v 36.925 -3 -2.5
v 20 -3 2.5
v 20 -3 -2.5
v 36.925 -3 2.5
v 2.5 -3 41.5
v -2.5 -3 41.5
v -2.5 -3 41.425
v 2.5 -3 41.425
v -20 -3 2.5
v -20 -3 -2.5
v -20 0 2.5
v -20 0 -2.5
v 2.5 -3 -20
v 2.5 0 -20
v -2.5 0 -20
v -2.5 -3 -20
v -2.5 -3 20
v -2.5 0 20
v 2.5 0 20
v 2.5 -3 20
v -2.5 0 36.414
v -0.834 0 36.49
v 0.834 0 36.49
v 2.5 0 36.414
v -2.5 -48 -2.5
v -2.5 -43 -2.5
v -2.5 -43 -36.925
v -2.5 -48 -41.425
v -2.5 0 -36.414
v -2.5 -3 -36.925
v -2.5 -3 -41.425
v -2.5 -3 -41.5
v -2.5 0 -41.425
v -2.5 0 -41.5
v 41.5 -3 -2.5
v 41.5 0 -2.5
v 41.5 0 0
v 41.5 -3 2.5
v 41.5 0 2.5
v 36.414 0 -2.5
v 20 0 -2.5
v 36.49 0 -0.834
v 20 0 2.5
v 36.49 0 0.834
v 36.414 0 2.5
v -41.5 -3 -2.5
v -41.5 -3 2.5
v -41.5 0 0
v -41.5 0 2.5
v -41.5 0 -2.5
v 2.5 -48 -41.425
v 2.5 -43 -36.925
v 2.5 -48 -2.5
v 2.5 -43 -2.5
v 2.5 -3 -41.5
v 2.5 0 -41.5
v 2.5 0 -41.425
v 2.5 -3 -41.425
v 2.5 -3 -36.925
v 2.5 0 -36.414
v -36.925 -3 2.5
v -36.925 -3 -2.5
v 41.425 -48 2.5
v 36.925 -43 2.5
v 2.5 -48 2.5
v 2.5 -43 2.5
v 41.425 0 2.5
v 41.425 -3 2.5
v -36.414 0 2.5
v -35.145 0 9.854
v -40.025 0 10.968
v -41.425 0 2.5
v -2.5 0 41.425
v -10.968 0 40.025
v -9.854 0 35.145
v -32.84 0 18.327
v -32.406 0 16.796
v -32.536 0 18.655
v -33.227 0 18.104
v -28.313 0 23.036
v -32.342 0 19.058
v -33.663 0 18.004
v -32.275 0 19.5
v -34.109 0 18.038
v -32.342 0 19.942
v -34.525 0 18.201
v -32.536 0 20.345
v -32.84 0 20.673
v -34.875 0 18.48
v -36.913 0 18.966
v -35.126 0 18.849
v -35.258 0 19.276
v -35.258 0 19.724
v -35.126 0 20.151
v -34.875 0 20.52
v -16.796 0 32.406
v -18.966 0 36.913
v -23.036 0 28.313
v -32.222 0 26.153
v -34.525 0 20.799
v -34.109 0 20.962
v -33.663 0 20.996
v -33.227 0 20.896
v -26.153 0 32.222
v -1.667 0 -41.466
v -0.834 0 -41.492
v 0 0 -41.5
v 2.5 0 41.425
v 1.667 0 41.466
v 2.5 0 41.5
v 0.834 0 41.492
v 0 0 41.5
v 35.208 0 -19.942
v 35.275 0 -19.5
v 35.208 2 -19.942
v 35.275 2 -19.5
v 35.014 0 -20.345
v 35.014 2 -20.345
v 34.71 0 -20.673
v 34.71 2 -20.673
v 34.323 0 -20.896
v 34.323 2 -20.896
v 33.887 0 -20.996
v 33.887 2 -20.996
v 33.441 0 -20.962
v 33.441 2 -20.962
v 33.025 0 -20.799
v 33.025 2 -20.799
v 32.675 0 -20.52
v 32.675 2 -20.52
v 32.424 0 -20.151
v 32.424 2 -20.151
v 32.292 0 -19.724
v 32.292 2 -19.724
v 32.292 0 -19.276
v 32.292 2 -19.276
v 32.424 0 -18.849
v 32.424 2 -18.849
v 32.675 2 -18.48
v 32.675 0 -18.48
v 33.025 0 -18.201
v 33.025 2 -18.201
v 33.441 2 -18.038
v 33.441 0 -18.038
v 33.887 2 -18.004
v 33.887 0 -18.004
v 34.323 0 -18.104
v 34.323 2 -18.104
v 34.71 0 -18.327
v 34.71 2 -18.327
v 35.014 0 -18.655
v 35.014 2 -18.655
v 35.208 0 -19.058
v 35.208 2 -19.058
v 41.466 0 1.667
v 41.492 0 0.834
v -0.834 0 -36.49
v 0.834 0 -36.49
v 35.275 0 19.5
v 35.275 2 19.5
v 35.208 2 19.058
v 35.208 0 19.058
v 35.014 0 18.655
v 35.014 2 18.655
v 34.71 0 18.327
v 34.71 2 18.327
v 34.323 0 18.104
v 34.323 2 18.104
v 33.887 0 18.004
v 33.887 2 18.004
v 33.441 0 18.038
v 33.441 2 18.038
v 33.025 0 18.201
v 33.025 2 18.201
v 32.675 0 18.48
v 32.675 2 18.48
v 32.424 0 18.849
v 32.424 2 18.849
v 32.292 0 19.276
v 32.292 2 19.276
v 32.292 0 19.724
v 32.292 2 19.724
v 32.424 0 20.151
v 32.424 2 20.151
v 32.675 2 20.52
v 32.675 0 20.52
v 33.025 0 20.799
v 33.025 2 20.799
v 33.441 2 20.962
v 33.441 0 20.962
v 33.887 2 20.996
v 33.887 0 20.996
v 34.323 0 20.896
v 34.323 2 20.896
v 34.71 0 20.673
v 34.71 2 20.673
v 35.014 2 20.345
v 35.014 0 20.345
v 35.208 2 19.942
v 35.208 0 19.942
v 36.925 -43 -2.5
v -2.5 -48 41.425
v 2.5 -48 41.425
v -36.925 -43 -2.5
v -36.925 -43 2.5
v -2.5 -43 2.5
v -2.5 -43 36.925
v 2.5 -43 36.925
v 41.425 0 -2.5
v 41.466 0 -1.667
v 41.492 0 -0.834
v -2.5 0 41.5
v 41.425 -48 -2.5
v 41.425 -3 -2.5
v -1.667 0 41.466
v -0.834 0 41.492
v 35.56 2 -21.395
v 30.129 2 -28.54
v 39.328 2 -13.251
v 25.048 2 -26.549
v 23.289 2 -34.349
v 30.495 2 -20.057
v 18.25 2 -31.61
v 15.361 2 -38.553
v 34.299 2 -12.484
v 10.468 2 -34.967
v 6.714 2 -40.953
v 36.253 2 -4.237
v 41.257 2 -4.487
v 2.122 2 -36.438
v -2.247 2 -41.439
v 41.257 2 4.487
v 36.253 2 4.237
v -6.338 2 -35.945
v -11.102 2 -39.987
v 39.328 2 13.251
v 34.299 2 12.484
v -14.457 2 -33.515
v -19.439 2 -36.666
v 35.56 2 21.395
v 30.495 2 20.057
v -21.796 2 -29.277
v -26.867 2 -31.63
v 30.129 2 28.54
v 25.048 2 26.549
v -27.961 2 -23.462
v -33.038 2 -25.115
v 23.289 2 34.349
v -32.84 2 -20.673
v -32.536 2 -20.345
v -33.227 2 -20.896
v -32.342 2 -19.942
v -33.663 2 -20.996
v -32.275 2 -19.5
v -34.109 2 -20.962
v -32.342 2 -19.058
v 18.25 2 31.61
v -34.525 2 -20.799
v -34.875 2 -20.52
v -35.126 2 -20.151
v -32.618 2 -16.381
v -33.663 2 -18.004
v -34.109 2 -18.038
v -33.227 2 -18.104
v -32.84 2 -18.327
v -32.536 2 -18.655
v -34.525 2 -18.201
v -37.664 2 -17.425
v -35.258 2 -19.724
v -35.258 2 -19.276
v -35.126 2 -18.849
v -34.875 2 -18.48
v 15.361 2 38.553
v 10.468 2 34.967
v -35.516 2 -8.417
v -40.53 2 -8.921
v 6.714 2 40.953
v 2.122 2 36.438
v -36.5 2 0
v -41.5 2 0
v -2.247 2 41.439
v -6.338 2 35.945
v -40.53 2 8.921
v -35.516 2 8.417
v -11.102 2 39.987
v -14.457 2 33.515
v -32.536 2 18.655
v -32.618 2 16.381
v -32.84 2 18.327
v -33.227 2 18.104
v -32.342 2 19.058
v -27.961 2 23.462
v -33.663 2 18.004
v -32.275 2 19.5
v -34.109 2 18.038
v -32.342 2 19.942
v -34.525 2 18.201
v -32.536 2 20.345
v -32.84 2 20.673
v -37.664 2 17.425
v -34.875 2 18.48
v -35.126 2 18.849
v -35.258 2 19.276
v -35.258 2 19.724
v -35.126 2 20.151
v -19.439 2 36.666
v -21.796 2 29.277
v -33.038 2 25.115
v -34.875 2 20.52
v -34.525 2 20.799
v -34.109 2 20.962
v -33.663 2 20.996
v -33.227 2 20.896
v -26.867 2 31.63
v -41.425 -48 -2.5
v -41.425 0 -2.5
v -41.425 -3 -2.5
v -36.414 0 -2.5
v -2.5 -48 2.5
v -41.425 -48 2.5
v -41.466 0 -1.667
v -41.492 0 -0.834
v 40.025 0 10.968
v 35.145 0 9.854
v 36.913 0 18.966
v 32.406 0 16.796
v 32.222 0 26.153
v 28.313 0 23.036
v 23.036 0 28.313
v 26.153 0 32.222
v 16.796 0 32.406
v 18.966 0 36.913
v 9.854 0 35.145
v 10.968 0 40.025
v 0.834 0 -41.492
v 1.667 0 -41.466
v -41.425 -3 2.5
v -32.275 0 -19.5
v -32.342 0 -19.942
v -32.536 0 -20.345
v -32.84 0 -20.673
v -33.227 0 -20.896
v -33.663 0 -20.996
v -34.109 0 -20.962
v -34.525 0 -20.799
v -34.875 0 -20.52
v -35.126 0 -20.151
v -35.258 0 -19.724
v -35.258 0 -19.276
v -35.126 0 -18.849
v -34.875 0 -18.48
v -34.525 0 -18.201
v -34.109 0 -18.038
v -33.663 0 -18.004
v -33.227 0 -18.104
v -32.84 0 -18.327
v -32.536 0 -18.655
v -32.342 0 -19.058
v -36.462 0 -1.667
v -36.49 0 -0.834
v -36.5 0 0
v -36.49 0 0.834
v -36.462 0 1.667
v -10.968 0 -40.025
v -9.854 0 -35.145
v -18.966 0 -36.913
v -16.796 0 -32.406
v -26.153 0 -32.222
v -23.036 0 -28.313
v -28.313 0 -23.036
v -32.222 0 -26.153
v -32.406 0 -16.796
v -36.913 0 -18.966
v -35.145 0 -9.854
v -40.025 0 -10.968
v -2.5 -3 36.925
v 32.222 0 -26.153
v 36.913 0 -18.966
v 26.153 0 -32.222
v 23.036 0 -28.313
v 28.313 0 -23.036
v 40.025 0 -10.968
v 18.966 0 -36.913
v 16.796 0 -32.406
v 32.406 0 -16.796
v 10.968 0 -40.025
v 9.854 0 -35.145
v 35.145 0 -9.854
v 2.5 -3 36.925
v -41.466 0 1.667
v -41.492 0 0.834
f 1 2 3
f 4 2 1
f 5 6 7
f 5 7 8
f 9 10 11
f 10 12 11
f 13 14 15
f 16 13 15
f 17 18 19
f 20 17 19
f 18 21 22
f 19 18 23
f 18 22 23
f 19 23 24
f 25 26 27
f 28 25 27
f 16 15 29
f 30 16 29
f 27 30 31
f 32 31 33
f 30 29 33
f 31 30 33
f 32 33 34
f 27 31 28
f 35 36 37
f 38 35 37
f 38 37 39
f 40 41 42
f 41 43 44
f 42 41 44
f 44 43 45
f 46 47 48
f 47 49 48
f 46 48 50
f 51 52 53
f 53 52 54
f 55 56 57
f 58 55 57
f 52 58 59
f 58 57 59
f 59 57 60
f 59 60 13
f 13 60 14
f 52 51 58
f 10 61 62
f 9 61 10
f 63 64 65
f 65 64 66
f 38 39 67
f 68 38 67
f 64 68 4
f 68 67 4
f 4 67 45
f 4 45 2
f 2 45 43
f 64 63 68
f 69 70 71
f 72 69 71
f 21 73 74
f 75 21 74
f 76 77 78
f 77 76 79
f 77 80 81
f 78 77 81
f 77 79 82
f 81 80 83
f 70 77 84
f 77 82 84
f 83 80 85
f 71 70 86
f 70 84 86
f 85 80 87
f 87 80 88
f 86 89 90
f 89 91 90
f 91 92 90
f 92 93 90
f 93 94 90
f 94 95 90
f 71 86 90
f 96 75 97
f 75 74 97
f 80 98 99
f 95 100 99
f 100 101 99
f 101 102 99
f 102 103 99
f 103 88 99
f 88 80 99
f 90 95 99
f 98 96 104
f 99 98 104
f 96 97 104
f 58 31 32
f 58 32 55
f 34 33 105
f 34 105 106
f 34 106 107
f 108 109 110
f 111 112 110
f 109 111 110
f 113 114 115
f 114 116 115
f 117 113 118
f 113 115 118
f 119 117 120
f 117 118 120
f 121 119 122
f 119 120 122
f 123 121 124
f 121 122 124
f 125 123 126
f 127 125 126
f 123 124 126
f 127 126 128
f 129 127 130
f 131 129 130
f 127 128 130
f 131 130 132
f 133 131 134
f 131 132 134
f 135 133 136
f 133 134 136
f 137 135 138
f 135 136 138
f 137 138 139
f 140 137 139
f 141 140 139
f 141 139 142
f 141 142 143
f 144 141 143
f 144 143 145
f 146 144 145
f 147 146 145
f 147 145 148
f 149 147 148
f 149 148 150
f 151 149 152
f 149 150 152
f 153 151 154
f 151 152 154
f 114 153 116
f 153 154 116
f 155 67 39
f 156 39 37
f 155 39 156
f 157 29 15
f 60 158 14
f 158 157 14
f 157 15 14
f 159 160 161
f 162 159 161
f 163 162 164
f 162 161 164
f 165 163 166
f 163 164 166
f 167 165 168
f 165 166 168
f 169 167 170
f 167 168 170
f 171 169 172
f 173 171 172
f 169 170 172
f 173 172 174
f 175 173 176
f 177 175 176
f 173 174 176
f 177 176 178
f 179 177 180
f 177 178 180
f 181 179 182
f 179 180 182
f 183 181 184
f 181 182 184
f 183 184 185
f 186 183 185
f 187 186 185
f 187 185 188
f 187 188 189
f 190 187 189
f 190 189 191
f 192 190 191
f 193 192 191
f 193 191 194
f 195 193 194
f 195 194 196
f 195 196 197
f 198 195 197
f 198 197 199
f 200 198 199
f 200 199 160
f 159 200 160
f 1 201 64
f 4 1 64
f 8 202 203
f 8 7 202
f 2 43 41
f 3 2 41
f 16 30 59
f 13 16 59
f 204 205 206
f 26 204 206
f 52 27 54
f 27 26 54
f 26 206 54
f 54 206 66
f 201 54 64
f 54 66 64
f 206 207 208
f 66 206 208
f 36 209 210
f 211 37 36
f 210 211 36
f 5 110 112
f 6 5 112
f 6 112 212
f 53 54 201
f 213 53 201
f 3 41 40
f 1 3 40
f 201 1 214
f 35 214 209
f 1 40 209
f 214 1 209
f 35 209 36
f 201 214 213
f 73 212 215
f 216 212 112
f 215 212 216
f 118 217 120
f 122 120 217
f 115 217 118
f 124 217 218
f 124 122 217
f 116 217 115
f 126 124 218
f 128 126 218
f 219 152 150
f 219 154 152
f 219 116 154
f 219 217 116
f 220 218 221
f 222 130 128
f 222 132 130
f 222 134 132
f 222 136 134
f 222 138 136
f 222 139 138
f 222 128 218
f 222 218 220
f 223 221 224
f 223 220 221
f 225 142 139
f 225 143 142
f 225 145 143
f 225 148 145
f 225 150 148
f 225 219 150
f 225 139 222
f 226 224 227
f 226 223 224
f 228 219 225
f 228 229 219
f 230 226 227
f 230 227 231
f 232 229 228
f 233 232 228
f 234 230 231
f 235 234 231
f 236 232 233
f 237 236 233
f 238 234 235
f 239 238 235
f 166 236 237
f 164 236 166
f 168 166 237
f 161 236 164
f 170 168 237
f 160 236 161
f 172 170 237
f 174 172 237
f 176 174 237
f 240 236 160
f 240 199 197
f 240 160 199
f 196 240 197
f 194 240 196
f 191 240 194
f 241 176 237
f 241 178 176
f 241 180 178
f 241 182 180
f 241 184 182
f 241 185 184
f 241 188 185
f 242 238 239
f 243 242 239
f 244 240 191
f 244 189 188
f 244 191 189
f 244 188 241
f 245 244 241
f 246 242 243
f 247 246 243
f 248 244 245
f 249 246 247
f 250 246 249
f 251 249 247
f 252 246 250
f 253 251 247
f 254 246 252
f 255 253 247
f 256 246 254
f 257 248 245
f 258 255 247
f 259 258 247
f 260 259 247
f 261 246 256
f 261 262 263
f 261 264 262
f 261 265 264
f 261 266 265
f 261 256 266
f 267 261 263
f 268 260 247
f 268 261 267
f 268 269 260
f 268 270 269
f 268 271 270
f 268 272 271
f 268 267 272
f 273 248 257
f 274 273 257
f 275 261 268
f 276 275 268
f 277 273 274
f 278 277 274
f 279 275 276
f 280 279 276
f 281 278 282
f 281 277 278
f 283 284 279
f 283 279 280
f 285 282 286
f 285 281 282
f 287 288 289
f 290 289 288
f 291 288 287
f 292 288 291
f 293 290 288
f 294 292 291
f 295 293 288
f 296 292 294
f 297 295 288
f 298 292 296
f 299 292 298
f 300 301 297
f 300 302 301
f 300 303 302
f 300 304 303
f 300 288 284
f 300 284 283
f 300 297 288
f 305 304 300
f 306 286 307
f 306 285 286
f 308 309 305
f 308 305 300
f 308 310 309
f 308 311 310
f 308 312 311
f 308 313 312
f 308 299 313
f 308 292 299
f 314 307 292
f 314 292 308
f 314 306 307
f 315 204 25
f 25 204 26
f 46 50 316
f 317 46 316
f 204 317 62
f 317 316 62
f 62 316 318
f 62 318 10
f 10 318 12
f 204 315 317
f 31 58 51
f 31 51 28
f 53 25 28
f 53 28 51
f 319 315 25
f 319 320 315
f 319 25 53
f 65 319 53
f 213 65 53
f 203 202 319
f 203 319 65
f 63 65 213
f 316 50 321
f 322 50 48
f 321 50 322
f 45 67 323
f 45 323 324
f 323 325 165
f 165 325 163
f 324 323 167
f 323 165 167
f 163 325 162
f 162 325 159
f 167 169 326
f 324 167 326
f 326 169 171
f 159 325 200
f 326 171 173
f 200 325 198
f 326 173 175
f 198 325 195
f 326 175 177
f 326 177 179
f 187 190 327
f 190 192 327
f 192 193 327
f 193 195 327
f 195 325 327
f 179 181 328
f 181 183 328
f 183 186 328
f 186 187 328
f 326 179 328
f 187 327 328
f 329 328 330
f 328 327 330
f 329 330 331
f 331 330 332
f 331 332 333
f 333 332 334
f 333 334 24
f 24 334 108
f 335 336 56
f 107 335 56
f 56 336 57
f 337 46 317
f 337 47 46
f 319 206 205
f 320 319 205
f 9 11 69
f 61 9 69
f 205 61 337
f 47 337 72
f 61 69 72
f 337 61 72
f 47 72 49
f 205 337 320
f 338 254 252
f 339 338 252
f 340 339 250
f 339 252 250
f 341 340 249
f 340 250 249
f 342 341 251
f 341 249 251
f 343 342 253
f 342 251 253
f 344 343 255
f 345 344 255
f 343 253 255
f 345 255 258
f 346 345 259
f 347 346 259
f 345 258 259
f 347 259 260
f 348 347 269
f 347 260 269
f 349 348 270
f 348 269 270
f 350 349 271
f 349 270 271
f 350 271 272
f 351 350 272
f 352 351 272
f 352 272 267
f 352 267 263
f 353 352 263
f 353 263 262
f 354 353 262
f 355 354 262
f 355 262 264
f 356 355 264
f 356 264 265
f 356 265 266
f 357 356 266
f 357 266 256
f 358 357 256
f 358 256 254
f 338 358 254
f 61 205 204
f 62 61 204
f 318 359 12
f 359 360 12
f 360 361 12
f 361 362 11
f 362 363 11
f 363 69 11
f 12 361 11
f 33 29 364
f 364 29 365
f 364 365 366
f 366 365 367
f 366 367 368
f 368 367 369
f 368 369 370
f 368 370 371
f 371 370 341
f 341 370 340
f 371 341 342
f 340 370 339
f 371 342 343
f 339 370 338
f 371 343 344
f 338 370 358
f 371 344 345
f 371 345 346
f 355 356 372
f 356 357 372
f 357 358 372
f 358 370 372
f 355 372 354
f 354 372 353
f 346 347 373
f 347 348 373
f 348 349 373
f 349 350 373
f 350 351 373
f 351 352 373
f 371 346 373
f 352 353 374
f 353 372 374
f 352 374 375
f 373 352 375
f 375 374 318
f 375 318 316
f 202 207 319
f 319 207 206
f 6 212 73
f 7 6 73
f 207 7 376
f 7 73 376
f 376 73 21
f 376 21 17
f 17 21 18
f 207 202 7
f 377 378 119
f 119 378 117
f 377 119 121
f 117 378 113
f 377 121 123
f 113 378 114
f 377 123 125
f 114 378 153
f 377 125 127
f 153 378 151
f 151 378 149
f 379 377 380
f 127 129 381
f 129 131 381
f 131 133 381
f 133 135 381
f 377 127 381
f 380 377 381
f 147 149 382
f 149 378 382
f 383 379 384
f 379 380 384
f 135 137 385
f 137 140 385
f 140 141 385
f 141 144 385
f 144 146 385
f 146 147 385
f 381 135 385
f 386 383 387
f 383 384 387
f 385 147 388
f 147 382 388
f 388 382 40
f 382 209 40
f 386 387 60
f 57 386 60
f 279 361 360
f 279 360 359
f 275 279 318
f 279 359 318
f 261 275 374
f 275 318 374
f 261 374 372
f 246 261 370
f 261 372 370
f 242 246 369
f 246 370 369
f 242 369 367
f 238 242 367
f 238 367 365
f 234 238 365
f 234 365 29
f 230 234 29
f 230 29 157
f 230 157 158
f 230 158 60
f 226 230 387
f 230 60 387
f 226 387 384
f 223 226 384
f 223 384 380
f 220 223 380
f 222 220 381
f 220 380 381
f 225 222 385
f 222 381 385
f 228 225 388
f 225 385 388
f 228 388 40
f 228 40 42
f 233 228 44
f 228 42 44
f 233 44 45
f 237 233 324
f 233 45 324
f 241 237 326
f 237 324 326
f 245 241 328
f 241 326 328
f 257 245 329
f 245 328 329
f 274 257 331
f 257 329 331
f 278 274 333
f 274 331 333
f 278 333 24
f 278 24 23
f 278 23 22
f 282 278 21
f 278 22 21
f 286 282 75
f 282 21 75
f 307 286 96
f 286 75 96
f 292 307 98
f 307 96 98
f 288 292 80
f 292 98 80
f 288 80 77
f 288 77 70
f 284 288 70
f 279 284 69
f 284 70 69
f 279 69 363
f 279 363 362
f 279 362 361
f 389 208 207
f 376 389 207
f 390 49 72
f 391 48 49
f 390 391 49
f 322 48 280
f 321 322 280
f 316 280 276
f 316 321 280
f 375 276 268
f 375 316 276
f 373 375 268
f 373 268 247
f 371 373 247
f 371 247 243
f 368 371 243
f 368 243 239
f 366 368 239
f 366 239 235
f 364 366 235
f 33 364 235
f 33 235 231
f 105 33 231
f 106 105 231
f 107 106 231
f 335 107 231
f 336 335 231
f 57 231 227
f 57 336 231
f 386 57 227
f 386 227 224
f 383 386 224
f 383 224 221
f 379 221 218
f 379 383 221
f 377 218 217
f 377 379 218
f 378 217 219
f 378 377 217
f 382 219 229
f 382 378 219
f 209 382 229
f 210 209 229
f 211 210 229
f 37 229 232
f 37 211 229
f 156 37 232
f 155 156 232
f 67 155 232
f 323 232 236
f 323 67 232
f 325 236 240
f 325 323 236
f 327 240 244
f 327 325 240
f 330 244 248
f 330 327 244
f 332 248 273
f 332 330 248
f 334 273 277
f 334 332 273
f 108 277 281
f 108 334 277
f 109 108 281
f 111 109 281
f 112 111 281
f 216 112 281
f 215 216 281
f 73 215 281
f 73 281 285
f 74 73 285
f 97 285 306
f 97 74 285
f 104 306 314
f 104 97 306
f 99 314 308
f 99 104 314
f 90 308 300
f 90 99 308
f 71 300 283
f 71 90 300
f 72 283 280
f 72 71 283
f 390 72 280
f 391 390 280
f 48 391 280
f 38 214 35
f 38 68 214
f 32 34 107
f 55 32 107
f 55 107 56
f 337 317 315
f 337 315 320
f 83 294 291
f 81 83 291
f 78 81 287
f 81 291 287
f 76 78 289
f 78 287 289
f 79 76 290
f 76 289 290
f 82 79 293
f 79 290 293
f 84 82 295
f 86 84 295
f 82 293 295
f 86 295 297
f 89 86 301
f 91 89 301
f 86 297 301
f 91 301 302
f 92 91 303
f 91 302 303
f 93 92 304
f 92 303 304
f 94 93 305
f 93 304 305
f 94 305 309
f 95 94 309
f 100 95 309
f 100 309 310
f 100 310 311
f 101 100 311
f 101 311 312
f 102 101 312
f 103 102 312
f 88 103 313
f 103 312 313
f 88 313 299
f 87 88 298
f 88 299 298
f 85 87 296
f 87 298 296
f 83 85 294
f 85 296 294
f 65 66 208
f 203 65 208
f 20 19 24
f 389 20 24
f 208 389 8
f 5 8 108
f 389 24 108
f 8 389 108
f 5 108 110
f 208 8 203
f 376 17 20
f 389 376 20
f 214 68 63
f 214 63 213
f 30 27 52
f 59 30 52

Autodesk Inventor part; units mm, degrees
ref_plane "YZ Plane" through (0, 0, 0) normal (1, 0, 0) x (0, 1, 0)
ref_plane "XZ Plane" through (0, 0, 0) normal (0, 1, 0) x (-1, 0, 0)
ref_plane "XY Plane" through (0, 0, 0) normal (0, 0, 1) x (1, 0, 0)
sketch "Sketch1" plane through (0, 0, 0) normal (0, 1, 0) x (-1, 0, 0)
  circle A0 centre (0, 0) radius 41.5
  circle A1 centre (0, 0) radius 36.5
  dimension "d0" = 83
  dimension "d1" = 73
extrude "Extrusion1" add sketch "Sketch1" along normal blind 2
sketch "Sketch4" plane through (0, 0, 0) normal (0, -1, 0) x (1, 0, 0)
  line L0 (-2.5, -20) -> (-2.5, -41.5)
  line L1 (-2.5, -41.5) -> (2.5, -41.5)
  line L2 (2.5, -41.5) -> (2.5, -20)
  line L3 (3.2204, 53.4593) -> (-2.5, -41.5) construction
  line L4 (-3.2204, 53.4593) -> (2.5, -41.5) construction
  line L5 (2.5, -20) -> (-2.5, -20)
  line L6 (41.5, 2.5) -> (20, 2.5)
  line L7 (20, -2.5) -> (41.5, -2.5)
  line L8 (20, 2.5) -> (20, -2.5)
  line L9 (41.5, -2.5) -> (41.5, 2.5)
  line L10 (-2.5, 41.5) -> (-2.5, 20)
  line L11 (2.5, 20) -> (2.5, 41.5)
  line L12 (-2.5, 20) -> (2.5, 20)
  line L13 (2.5, 41.5) -> (-2.5, 41.5)
  line L14 (-41.5, -2.5) -> (-20, -2.5)
  line L15 (-20, 2.5) -> (-41.5, 2.5)
  line L16 (-20, -2.5) -> (-20, 2.5)
  line L17 (-41.5, 2.5) -> (-41.5, -2.5)
  point P0 (0, 0)
  dimension "d21" = 5
  dimension "d26" = 360
  dimension "d51" = 20
  dimension "d52" = 41.5
extrude "Extrusion3" add sketch "Sketch4" along normal blind 3
sketch "Sketch5" plane through (0, -3, 0) normal (0, -1, 0) x (1, 0, 0)
  arc A0 (-41.4246, 2.5) -> (2.5, -41.4246) centre (0, 0) ccw projected
  line L0 (2.5, -41.4246) -> (-2.5, -41.4246)
  line L1 (-2.5, -41.4246) -> (-2.5, -36.9246)
  line L2 (-2.5, -36.9246) -> (2.5, -36.9246)
  line L3 (2.5, -36.9246) -> (2.5, -41.4246)
  line L4 (41.4246, 2.5) -> (41.4246, -2.5)
  line L5 (41.4246, -2.5) -> (36.9246, -2.5)
  line L6 (36.9246, -2.5) -> (36.9246, 2.5)
  line L7 (36.9246, 2.5) -> (41.4246, 2.5)
  line L8 (-2.5, 41.4246) -> (2.5, 41.4246)
  line L9 (2.5, 41.4246) -> (2.5, 36.9246)
  line L10 (2.5, 36.9246) -> (-2.5, 36.9246)
  line L11 (-2.5, 36.9246) -> (-2.5, 41.4246)
  line L12 (-41.4246, -2.5) -> (-41.4246, 2.5)
  line L13 (-41.4246, 2.5) -> (-36.9246, 2.5)
  line L14 (-36.9246, 2.5) -> (-36.9246, -2.5)
  line L15 (-36.9246, -2.5) -> (-41.4246, -2.5)
  point P0 (0, -41.5)
  dimension "d30" = 5
  dimension "d31" = 4.5
  dimension "d34" = 360
extrude "Extrusion4" add sketch "Sketch5" along normal blind 40 contours L13 L14 L15 L12 | L1 L2 L3 L0 | L4 L5 L6 L7 | L8 L9 L10 L11
sketch "Sketch7" plane through (0, 2, 0) normal (0, 1, 0) x (1, 0, 0)
  circle A0 centre (0, -39) radius 1.5
  circle A1 centre (0, -44.5) radius 1.5
  circle A2 centre (38.5381, -22.25) radius 1.5
  circle A3 centre (33.775, -19.5) radius 1.5
  circle A4 centre (38.5381, 22.25) radius 1.5
  circle A5 centre (33.775, 19.5) radius 1.5
  circle A6 centre (0, 44.5) radius 1.5
  circle A7 centre (0, 39) radius 1.5
  circle A8 centre (-38.5381, 22.25) radius 1.5
  circle A9 centre (-33.775, 19.5) radius 1.5
  circle A10 centre (-38.5381, -22.25) radius 1.5
  circle A11 centre (-33.775, -19.5) radius 1.5
  point P0 (0, 0)
  dimension "d41" = 3
  dimension "d42" = 39
  dimension "d43" = 3
  dimension "d44" = 44.5
  dimension "d47" = 360
extrude "Extrusion6" cut sketch "Sketch7" against normal blind 10 contours A2 | A3 | A4 | A5 | A8 | A9 | A10 | A11
sketch "Sketch8" plane through (0, -43, 0) normal (0, -1, 0) x (1, 0, 0)
  line L0 (-2.5, 36.4143) -> (-2.5, 41.4246) projected
  arc A0 (0, -41.5) -> (2.5, -41.4246) centre (0, 0) ccw projected
  line L1 (-2.5, 41.4246) -> (2.5, 41.4246)
  line L2 (2.5, 41.4246) -> (2.5, -41.4246)
  line L3 (2.5, -41.4246) -> (-2.5, -41.4246)
  line L4 (-2.5, -41.4246) -> (-2.5, 41.4246)
  line L5 (-36.4143, -2.5) -> (-41.4246, -2.5) projected
  line L6 (36.4143, 2.5) -> (41.4246, 2.5) projected
  line L7 (-41.4246, -2.5) -> (41.4246, -2.5)
  line L8 (41.4246, -2.5) -> (41.4246, 2.5)
  line L9 (41.4246, 2.5) -> (-41.4246, 2.5)
  line L10 (-41.4246, 2.5) -> (-41.4246, -2.5)
extrude "Extrusion7" add sketch "Sketch8" along normal blind 5
properties part number "Bottom- Control Surfaces"
